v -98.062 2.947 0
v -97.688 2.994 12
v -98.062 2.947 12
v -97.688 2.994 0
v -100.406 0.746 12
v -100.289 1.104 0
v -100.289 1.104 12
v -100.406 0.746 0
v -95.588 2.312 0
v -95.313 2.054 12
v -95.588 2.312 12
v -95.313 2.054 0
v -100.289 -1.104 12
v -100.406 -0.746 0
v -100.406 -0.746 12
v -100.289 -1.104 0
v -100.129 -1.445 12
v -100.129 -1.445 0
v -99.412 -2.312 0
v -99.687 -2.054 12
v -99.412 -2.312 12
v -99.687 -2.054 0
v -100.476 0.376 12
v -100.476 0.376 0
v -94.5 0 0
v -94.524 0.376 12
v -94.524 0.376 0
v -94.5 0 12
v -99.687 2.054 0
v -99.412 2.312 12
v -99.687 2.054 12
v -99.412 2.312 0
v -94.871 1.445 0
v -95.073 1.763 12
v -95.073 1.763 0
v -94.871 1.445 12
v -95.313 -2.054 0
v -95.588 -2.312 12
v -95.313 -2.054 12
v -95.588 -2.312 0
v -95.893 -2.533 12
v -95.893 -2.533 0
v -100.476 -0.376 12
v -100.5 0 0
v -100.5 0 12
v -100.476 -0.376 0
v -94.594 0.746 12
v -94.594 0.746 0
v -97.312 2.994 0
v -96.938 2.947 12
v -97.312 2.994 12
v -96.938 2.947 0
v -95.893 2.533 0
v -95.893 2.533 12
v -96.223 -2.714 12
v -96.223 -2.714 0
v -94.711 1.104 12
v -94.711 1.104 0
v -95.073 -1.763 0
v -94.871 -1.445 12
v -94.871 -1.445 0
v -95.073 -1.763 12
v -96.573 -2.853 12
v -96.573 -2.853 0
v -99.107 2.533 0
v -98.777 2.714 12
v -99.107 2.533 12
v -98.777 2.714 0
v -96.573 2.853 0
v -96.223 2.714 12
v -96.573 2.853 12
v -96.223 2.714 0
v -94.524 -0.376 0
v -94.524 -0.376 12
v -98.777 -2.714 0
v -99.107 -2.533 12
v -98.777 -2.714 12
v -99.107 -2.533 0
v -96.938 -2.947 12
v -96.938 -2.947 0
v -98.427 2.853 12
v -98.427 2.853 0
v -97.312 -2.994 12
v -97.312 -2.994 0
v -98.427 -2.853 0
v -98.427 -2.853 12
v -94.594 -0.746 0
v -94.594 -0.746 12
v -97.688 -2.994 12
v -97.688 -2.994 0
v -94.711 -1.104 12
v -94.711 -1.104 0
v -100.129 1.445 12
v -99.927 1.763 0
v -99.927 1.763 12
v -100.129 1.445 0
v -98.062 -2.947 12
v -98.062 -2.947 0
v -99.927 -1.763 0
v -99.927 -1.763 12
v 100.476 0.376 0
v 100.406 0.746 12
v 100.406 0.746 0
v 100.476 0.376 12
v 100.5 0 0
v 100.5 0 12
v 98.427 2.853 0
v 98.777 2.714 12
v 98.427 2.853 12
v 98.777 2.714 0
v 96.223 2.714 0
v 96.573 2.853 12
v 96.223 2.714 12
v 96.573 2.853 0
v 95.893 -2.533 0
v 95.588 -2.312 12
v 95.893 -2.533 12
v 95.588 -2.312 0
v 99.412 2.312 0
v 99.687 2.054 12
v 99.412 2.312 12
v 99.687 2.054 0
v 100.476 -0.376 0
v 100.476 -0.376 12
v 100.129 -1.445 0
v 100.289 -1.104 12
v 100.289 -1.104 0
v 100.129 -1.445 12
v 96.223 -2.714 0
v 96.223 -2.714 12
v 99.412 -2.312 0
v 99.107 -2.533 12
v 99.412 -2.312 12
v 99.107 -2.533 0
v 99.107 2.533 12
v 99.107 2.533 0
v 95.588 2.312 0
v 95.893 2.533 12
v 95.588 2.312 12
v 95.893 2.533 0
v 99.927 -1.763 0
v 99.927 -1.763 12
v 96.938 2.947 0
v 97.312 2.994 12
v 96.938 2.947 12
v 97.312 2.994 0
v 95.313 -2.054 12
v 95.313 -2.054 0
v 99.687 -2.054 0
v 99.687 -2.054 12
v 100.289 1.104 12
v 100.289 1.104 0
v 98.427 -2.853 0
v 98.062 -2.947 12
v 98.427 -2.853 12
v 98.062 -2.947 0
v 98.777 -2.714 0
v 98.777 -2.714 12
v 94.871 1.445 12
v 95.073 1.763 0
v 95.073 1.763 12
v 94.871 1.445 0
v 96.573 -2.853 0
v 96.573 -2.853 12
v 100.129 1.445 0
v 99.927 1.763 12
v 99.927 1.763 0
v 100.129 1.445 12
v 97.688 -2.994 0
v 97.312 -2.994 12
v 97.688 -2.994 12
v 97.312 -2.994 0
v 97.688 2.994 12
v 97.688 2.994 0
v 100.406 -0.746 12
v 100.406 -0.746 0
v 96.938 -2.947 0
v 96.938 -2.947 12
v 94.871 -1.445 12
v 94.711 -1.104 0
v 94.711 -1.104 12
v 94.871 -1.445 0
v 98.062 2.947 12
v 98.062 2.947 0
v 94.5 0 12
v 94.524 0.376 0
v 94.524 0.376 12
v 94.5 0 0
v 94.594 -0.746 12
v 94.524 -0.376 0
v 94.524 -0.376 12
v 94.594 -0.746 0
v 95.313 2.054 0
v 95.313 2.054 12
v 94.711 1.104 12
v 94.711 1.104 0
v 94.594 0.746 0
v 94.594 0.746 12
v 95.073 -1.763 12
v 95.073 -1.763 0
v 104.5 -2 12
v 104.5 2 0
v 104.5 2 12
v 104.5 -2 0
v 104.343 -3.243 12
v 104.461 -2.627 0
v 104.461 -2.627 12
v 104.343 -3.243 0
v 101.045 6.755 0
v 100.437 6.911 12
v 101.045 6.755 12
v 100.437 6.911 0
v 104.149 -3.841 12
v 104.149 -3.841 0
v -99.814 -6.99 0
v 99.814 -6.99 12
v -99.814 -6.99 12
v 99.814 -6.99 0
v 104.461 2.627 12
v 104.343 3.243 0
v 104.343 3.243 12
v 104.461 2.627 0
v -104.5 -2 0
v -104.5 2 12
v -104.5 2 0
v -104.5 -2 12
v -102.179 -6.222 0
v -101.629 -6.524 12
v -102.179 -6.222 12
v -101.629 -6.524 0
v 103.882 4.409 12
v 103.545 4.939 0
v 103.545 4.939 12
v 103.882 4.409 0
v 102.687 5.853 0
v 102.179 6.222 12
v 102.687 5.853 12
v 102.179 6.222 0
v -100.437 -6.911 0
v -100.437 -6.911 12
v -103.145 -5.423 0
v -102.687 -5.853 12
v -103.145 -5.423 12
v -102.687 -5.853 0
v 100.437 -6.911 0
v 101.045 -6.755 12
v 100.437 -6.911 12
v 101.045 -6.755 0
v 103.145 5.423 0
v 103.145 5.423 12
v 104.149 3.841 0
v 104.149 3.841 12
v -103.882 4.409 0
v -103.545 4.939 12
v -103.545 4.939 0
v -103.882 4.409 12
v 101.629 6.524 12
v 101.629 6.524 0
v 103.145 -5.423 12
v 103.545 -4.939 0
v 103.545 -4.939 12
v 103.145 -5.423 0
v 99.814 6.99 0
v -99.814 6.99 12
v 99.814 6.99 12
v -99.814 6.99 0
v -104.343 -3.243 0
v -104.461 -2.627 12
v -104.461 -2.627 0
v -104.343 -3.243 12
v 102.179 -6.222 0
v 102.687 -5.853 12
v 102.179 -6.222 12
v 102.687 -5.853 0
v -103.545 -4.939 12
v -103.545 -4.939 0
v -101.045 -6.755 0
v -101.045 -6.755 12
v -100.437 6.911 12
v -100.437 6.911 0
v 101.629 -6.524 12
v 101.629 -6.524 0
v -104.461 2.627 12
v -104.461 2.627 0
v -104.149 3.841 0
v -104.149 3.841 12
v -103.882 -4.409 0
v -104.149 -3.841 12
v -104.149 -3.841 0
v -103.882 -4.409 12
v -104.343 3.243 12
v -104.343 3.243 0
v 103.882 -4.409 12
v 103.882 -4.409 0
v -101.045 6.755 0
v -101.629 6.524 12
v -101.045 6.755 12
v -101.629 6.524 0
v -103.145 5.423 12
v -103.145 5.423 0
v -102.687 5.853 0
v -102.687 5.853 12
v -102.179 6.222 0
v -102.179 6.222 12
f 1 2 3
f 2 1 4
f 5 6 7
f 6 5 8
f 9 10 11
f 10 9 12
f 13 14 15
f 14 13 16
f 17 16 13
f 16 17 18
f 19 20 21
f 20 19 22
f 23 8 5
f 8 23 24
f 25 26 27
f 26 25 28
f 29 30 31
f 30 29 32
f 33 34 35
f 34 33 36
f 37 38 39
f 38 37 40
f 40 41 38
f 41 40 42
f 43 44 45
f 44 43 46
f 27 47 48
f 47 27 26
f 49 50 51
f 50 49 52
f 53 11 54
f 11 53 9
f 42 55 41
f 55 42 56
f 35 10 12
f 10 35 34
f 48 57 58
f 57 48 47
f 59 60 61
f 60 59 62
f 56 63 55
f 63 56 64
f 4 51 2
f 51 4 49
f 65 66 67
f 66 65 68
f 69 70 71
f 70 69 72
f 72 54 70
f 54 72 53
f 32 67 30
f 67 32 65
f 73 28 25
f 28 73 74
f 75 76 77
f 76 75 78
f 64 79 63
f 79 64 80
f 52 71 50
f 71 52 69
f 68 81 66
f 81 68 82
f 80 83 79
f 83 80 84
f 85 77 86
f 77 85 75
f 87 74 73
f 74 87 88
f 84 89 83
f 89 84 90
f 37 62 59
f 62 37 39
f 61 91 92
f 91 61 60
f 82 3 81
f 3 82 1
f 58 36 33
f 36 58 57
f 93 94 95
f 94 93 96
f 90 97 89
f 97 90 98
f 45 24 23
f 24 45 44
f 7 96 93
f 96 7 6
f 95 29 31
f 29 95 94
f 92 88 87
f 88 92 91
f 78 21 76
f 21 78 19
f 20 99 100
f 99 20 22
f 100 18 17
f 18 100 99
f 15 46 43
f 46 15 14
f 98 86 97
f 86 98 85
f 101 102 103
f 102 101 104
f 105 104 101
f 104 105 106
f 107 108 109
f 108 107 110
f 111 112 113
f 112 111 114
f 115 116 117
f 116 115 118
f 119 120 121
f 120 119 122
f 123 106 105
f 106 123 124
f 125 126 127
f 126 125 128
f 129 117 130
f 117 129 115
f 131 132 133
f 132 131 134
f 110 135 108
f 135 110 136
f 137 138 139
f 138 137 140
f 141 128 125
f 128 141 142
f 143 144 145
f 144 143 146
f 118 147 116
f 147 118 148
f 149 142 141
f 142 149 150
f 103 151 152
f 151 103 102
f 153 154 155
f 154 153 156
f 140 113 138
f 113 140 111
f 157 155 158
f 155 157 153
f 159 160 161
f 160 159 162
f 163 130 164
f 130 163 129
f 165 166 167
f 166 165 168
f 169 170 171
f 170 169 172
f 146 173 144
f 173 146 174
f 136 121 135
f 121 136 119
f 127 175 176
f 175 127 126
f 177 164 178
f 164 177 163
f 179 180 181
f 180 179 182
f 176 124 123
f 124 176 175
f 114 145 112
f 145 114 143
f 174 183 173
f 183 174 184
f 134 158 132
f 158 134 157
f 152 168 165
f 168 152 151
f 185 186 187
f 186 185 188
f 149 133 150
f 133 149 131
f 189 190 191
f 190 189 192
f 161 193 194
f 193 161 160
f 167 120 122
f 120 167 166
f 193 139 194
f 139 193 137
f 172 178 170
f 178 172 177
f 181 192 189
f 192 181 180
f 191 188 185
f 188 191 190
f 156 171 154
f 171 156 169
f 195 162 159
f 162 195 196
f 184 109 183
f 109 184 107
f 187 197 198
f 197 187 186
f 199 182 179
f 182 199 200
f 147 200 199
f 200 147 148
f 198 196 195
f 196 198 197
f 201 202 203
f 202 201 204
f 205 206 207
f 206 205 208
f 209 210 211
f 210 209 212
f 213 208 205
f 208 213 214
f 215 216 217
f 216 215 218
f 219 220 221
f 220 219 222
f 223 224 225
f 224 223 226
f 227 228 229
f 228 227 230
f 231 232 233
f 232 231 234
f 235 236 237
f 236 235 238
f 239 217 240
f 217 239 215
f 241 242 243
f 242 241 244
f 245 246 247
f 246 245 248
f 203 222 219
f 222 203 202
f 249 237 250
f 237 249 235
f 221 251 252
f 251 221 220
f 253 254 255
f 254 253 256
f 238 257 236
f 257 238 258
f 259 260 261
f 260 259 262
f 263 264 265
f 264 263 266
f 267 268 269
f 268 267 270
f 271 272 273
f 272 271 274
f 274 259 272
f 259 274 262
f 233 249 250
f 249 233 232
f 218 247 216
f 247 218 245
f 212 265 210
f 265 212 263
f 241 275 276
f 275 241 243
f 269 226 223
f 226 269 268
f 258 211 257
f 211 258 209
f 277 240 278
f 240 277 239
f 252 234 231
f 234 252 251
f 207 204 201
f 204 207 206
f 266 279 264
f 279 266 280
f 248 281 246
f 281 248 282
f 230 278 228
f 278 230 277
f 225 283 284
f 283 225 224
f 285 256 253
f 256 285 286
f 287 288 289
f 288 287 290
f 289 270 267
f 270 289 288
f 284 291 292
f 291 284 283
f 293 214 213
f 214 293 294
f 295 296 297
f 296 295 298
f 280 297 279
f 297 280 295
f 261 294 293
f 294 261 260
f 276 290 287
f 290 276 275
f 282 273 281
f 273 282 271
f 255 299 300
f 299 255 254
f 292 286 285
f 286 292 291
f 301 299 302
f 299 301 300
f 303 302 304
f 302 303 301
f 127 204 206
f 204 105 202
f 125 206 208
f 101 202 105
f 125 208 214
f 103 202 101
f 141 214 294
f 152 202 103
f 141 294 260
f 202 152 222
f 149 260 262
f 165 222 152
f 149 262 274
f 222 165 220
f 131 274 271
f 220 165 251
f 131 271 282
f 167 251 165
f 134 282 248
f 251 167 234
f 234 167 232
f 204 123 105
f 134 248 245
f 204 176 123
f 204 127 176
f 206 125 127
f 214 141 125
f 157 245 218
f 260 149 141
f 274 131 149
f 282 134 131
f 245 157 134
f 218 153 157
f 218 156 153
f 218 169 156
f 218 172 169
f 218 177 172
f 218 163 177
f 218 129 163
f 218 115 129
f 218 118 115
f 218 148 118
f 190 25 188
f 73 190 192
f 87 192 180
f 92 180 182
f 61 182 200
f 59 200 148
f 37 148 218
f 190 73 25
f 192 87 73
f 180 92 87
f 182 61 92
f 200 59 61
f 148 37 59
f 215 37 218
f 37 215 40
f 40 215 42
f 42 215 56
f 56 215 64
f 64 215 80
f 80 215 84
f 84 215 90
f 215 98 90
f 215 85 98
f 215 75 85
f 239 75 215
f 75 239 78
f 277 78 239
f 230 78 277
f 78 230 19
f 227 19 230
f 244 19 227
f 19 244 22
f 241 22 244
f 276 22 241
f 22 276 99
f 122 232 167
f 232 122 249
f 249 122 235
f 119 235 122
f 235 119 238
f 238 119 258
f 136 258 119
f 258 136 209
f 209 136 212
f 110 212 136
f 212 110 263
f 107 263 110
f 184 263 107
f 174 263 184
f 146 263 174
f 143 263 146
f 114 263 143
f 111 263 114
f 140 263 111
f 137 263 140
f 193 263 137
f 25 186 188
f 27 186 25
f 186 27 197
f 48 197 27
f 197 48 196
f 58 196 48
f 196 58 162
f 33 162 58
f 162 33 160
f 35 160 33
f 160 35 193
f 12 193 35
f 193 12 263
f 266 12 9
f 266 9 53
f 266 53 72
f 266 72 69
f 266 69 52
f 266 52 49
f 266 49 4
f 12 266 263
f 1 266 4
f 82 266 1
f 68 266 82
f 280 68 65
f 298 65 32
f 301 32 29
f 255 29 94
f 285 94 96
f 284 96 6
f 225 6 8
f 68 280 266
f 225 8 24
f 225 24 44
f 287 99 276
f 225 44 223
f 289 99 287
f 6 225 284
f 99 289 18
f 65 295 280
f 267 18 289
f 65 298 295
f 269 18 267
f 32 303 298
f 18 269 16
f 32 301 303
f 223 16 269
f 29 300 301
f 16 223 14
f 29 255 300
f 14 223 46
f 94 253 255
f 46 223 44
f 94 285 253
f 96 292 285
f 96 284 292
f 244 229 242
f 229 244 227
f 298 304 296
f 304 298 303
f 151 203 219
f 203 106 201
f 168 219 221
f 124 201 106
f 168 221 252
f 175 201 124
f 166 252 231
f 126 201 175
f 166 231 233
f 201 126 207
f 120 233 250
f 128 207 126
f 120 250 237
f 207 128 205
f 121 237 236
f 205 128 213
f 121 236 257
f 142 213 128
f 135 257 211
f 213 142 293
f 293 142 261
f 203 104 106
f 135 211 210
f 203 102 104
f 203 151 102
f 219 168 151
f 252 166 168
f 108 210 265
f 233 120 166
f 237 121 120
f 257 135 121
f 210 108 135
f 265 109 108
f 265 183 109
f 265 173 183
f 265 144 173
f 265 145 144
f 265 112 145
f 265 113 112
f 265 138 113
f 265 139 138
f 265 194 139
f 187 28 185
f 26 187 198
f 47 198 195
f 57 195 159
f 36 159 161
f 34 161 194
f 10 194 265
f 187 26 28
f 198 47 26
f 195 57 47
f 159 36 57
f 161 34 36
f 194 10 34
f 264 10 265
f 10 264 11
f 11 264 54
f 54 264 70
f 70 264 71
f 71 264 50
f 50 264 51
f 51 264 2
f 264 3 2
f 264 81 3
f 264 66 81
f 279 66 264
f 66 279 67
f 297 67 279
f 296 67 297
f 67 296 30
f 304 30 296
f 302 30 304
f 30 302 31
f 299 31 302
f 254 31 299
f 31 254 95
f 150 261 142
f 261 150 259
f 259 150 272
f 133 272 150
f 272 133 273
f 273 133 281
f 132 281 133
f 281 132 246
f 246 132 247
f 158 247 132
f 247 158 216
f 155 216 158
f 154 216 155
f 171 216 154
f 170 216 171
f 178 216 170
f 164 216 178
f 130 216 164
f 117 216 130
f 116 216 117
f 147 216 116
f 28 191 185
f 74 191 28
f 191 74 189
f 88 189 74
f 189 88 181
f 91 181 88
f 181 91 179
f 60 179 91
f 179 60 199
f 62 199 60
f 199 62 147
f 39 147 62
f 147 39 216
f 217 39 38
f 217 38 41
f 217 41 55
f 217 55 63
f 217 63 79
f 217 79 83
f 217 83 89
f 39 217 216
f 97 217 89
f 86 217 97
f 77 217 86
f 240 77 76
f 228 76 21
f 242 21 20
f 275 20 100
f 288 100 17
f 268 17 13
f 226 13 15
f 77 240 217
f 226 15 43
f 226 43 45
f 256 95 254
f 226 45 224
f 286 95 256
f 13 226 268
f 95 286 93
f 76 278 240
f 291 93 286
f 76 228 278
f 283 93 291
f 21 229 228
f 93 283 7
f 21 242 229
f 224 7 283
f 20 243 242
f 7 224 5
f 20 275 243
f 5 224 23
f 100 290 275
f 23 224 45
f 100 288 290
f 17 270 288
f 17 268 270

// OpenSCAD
$fn = 50;


difference() {
	union() {
		hull() {
			translate(v = [-99.5000000000, 2.0000000000, 0]) {
				cylinder(h = 12, r = 5);
			}
			translate(v = [99.5000000000, 2.0000000000, 0]) {
				cylinder(h = 12, r = 5);
			}
			translate(v = [-99.5000000000, -2.0000000000, 0]) {
				cylinder(h = 12, r = 5);
			}
			translate(v = [99.5000000000, -2.0000000000, 0]) {
				cylinder(h = 12, r = 5);
			}
		}
	}
	union() {
		translate(v = [-97.5000000000, 0.0000000000, -100.0000000000]) {
			cylinder(h = 200, r = 3.0000000000);
		}
		translate(v = [-97.5000000000, 0.0000000000, -100.0000000000]) {
			cylinder(h = 200, r = 3.0000000000);
		}
		translate(v = [97.5000000000, 0.0000000000, -100.0000000000]) {
			cylinder(h = 200, r = 3.0000000000);
		}
		translate(v = [97.5000000000, 0.0000000000, -100.0000000000]) {
			cylinder(h = 200, r = 3.0000000000);
		}
	}
}
